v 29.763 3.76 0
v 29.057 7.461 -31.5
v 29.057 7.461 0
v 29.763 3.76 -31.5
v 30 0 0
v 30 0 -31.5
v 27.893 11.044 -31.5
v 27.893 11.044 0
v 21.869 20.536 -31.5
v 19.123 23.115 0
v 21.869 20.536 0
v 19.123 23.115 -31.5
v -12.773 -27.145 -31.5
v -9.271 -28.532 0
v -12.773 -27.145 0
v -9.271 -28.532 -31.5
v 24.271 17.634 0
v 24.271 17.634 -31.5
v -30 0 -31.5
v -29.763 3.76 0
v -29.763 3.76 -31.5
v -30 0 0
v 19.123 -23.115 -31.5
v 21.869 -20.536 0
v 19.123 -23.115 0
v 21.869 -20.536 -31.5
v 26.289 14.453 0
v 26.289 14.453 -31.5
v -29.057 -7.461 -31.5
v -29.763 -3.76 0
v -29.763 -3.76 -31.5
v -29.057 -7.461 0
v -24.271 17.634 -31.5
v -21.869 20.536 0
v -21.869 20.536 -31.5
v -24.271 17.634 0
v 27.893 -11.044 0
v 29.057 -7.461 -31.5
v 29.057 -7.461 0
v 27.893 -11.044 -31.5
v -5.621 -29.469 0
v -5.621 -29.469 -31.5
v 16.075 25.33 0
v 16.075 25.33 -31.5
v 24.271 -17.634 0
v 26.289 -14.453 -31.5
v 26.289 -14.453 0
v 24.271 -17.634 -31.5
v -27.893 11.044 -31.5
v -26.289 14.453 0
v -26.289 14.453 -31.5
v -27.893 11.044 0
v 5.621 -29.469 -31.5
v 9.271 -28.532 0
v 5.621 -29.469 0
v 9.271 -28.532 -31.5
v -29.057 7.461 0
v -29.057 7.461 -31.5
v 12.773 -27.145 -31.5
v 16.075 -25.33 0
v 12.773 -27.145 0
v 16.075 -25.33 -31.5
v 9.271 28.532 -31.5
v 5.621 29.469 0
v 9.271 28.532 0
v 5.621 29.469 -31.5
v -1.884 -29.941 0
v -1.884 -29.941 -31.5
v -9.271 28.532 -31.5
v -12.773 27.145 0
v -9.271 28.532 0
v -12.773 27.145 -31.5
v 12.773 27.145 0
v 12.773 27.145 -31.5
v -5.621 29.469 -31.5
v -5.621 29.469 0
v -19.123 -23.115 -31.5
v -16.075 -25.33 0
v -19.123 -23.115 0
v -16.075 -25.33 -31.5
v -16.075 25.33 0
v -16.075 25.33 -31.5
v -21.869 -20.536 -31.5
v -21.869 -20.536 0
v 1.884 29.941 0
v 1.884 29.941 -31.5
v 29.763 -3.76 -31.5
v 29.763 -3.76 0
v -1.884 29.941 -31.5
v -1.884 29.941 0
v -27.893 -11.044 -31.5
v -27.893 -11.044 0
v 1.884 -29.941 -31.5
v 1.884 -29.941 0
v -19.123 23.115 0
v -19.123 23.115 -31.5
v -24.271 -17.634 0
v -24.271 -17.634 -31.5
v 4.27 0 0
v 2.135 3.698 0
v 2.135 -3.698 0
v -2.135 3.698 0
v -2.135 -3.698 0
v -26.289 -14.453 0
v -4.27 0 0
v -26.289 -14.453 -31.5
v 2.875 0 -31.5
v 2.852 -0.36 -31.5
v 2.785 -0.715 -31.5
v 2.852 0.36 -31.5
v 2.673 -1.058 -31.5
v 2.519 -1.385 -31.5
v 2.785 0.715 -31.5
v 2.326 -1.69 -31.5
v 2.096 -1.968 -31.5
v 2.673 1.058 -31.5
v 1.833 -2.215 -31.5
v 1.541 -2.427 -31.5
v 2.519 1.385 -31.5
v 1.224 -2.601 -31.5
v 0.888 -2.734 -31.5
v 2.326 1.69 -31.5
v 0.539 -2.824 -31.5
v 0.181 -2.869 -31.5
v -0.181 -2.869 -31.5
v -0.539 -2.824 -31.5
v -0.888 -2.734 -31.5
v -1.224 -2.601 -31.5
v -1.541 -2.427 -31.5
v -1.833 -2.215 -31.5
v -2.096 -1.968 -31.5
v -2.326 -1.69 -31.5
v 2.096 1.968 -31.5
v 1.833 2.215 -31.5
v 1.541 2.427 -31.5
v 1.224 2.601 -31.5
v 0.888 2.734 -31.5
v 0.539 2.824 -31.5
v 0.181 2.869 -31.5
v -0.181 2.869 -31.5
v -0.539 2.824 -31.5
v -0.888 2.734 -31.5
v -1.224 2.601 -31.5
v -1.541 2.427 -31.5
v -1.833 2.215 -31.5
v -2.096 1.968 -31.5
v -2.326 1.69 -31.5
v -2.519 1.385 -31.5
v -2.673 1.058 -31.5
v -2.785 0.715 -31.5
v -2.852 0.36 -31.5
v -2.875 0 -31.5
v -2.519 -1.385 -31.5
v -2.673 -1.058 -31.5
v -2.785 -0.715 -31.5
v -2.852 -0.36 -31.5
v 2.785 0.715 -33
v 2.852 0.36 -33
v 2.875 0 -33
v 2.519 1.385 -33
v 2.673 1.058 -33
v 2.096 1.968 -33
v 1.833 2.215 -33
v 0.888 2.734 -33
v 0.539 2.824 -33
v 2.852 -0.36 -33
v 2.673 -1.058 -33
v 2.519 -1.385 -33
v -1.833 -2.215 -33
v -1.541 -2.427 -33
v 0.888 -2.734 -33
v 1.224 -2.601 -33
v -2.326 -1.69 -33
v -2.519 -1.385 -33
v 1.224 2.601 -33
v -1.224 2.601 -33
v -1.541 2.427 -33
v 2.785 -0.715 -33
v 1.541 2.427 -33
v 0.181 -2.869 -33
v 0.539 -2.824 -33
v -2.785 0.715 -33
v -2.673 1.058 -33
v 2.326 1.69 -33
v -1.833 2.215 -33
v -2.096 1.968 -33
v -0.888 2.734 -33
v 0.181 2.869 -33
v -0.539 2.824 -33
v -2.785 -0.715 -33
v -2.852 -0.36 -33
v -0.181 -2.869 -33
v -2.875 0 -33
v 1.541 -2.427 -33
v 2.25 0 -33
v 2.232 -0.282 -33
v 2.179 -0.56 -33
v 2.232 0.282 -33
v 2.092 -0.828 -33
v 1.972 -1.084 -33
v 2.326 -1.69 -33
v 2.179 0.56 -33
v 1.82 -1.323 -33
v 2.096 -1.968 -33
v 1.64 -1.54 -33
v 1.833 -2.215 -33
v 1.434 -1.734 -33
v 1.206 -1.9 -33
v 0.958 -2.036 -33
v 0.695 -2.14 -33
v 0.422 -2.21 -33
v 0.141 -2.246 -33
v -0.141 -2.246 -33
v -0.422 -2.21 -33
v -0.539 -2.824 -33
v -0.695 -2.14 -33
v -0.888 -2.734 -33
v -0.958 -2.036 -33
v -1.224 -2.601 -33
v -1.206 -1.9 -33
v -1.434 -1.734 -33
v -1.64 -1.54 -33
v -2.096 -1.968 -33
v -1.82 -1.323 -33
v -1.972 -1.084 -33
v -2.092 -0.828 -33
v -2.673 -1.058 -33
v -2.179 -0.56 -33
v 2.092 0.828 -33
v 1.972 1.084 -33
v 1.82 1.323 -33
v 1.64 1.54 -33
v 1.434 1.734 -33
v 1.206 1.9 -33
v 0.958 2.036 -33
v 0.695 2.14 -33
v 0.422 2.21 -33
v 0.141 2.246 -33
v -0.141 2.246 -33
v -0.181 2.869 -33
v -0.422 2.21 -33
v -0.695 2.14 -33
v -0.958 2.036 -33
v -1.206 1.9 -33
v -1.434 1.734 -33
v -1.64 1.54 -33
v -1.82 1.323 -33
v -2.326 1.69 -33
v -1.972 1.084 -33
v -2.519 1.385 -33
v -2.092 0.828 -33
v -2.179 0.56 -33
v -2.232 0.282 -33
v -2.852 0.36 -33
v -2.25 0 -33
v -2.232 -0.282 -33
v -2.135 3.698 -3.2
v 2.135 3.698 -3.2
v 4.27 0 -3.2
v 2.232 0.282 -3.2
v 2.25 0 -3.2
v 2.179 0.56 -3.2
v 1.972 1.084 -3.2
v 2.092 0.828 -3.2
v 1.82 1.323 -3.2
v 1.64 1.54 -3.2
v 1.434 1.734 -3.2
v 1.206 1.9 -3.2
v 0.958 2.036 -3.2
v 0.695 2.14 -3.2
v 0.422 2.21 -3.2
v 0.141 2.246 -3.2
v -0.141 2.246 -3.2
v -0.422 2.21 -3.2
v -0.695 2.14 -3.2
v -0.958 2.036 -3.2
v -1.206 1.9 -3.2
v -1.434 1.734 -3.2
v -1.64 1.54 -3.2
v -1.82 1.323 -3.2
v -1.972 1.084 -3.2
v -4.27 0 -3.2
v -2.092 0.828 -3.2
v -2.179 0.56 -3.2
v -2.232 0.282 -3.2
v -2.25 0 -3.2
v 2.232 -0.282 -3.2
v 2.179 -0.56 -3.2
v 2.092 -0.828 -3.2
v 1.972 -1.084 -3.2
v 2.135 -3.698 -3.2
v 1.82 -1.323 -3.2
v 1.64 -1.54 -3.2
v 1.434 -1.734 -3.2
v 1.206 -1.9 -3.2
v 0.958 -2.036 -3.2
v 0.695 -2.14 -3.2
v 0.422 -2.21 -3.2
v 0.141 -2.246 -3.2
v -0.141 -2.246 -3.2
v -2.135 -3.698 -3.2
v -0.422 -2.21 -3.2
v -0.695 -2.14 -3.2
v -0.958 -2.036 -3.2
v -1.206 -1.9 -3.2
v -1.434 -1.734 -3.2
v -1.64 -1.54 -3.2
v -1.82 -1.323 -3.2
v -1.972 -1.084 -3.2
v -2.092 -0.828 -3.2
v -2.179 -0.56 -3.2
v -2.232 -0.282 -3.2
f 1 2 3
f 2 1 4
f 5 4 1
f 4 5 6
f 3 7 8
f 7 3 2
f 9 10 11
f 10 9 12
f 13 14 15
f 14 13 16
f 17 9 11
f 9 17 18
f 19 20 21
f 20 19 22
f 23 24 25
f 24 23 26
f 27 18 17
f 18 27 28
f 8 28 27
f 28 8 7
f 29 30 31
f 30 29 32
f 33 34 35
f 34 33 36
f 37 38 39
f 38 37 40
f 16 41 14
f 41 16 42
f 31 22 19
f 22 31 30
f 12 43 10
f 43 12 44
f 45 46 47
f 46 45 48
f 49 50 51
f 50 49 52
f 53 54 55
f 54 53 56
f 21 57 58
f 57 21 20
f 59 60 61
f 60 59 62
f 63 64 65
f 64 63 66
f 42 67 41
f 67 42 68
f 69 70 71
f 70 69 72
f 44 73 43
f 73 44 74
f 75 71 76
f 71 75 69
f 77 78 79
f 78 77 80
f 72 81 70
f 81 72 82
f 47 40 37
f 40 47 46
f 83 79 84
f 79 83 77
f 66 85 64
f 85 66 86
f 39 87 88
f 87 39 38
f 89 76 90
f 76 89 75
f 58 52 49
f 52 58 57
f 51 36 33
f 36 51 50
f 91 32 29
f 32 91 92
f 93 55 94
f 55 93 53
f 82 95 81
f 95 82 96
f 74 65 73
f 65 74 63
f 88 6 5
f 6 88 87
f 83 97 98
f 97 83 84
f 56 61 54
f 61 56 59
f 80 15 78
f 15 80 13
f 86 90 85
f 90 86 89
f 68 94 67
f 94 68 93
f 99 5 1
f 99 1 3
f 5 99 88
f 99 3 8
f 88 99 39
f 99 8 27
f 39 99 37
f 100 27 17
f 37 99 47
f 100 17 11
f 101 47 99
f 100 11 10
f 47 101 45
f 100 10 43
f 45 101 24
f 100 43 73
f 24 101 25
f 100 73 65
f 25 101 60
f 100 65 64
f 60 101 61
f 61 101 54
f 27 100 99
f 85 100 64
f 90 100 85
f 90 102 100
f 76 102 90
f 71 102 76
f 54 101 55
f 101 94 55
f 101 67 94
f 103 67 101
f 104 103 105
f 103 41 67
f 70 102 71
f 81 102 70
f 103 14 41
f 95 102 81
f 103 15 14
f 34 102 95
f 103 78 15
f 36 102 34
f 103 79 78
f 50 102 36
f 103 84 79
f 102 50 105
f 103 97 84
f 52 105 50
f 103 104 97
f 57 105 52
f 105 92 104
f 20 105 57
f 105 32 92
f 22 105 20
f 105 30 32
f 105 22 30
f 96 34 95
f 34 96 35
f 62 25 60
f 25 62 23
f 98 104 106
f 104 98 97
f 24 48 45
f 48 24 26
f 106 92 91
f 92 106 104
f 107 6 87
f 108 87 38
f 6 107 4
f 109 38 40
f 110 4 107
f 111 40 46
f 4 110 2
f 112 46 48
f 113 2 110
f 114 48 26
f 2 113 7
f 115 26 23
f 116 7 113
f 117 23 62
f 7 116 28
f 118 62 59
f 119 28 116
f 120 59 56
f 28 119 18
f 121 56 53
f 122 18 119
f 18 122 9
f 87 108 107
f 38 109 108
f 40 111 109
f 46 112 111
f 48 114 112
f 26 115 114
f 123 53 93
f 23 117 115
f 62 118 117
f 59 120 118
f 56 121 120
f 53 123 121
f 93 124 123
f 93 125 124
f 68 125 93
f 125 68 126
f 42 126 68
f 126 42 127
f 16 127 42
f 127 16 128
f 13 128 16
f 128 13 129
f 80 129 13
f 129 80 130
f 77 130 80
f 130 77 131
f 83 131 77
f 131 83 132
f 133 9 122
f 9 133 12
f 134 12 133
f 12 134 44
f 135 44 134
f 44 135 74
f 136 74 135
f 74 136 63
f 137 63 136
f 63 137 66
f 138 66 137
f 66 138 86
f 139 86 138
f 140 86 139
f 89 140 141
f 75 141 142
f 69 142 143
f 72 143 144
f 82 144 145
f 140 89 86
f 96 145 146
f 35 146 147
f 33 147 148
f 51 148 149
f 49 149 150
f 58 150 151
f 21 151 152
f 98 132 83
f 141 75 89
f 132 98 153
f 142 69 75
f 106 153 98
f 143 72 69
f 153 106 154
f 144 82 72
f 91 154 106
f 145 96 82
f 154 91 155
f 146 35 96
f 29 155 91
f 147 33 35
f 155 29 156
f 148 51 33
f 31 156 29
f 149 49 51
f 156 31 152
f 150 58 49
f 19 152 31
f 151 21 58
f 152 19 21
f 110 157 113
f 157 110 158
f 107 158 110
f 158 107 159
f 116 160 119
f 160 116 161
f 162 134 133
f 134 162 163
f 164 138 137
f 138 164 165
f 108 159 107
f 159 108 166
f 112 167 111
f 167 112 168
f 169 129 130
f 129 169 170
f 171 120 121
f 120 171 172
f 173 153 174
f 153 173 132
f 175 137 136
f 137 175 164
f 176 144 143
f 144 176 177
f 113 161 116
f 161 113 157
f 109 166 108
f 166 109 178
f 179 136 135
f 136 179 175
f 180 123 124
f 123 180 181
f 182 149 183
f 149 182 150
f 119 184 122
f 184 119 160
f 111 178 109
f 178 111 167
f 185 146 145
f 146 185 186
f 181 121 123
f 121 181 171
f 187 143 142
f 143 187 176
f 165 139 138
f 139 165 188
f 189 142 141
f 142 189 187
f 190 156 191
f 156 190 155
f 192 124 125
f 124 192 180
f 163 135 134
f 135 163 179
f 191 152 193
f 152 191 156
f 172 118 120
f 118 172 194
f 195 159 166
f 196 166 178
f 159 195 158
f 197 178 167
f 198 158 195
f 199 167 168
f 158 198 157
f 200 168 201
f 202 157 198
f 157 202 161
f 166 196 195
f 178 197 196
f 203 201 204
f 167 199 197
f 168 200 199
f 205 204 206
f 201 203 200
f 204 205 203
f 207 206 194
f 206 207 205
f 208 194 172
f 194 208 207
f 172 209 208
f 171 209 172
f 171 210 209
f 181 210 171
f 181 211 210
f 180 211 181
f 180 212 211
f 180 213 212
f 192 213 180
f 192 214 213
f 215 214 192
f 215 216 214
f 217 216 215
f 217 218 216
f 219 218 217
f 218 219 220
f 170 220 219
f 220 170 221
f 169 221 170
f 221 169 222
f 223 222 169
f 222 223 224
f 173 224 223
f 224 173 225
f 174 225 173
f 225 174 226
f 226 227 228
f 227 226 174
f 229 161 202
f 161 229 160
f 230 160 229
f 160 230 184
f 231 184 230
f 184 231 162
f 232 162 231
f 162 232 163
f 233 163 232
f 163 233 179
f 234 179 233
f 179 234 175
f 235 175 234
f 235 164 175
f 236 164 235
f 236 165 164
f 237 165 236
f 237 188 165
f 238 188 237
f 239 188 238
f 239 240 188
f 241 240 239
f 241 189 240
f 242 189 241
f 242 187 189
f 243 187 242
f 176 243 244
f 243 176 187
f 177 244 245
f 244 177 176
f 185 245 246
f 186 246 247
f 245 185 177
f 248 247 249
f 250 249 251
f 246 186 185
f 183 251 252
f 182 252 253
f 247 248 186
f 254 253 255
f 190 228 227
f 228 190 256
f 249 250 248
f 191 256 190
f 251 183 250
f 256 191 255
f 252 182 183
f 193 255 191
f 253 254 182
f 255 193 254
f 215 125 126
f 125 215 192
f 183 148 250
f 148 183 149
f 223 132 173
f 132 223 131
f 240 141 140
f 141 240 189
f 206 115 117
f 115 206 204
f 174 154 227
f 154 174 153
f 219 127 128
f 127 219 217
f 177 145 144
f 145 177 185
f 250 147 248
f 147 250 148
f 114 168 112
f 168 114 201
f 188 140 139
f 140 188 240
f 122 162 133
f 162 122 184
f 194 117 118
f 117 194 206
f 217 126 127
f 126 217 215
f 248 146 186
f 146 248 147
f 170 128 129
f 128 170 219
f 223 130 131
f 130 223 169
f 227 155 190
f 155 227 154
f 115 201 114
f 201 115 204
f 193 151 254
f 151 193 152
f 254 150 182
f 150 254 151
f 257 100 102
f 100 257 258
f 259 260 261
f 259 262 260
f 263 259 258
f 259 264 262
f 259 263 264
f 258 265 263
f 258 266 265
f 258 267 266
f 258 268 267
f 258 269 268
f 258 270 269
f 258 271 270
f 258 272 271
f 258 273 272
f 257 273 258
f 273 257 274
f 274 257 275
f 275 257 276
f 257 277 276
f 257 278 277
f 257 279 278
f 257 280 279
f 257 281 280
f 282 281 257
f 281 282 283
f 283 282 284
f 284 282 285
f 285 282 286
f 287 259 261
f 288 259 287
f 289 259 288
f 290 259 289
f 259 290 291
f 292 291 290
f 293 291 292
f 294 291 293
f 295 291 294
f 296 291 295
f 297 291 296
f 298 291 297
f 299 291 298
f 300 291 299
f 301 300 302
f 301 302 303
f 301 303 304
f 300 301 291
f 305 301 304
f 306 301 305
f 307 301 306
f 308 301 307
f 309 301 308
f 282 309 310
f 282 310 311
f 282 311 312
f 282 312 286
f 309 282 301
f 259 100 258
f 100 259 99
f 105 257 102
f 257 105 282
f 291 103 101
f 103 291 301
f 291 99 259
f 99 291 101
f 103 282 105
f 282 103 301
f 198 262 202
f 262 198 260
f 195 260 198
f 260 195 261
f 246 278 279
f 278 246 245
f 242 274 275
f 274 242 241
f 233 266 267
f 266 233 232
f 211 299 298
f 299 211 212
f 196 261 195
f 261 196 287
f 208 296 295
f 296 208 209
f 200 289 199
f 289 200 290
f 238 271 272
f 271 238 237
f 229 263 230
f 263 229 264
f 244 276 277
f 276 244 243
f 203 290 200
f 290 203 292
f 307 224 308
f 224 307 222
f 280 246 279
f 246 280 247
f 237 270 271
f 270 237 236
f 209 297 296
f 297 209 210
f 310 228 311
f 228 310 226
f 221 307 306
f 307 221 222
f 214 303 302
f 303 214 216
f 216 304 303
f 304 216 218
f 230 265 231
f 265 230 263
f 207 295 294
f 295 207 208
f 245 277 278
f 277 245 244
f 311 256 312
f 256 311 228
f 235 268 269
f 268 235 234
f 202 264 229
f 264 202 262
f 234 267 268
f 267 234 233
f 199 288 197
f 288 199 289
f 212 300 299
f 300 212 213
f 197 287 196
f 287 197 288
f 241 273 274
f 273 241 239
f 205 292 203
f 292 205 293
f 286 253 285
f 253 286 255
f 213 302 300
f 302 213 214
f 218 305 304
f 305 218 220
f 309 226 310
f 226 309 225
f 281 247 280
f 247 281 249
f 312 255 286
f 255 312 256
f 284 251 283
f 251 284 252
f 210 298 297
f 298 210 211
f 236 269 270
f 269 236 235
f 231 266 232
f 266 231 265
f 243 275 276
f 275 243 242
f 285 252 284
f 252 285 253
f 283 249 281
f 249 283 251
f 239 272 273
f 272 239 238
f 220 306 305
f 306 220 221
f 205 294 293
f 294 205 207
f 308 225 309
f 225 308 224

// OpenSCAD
$fn = 50;

difference() {
	union() {
		translate(v = [0, 0, -31.5]) {
			cylinder(h = 31.5, r = 30.0);
		}
		#translate(v = [0, 0, -33.0]) {
			cylinder(h = 33, r = 2.875);
		}
	}
	union() {
		translate(v = [0, 0, 0]) {
			rotate(a = [0, 0, 0]) {
				difference() {
					union() {
						translate(v = [0, 0, -3.2]) {
							linear_extrude(height = 3.2) {
								polygon(points = [[4.2698, 0.0], [2.1349000000000005, 3.697755269078796], [-2.134899999999999, 3.6977552690787965], [-4.2698, 5.228996902999369e-16], [-2.134900000000002, -3.6977552690787956], [2.1348999999999974, -3.697755269078798]]);
							}
						}
					}
					union();
				}
			}
		}
		#translate(v = [0, 0, -100.0]) {
			cylinder(h = 200, r = 2.25);
		}
	}
}
